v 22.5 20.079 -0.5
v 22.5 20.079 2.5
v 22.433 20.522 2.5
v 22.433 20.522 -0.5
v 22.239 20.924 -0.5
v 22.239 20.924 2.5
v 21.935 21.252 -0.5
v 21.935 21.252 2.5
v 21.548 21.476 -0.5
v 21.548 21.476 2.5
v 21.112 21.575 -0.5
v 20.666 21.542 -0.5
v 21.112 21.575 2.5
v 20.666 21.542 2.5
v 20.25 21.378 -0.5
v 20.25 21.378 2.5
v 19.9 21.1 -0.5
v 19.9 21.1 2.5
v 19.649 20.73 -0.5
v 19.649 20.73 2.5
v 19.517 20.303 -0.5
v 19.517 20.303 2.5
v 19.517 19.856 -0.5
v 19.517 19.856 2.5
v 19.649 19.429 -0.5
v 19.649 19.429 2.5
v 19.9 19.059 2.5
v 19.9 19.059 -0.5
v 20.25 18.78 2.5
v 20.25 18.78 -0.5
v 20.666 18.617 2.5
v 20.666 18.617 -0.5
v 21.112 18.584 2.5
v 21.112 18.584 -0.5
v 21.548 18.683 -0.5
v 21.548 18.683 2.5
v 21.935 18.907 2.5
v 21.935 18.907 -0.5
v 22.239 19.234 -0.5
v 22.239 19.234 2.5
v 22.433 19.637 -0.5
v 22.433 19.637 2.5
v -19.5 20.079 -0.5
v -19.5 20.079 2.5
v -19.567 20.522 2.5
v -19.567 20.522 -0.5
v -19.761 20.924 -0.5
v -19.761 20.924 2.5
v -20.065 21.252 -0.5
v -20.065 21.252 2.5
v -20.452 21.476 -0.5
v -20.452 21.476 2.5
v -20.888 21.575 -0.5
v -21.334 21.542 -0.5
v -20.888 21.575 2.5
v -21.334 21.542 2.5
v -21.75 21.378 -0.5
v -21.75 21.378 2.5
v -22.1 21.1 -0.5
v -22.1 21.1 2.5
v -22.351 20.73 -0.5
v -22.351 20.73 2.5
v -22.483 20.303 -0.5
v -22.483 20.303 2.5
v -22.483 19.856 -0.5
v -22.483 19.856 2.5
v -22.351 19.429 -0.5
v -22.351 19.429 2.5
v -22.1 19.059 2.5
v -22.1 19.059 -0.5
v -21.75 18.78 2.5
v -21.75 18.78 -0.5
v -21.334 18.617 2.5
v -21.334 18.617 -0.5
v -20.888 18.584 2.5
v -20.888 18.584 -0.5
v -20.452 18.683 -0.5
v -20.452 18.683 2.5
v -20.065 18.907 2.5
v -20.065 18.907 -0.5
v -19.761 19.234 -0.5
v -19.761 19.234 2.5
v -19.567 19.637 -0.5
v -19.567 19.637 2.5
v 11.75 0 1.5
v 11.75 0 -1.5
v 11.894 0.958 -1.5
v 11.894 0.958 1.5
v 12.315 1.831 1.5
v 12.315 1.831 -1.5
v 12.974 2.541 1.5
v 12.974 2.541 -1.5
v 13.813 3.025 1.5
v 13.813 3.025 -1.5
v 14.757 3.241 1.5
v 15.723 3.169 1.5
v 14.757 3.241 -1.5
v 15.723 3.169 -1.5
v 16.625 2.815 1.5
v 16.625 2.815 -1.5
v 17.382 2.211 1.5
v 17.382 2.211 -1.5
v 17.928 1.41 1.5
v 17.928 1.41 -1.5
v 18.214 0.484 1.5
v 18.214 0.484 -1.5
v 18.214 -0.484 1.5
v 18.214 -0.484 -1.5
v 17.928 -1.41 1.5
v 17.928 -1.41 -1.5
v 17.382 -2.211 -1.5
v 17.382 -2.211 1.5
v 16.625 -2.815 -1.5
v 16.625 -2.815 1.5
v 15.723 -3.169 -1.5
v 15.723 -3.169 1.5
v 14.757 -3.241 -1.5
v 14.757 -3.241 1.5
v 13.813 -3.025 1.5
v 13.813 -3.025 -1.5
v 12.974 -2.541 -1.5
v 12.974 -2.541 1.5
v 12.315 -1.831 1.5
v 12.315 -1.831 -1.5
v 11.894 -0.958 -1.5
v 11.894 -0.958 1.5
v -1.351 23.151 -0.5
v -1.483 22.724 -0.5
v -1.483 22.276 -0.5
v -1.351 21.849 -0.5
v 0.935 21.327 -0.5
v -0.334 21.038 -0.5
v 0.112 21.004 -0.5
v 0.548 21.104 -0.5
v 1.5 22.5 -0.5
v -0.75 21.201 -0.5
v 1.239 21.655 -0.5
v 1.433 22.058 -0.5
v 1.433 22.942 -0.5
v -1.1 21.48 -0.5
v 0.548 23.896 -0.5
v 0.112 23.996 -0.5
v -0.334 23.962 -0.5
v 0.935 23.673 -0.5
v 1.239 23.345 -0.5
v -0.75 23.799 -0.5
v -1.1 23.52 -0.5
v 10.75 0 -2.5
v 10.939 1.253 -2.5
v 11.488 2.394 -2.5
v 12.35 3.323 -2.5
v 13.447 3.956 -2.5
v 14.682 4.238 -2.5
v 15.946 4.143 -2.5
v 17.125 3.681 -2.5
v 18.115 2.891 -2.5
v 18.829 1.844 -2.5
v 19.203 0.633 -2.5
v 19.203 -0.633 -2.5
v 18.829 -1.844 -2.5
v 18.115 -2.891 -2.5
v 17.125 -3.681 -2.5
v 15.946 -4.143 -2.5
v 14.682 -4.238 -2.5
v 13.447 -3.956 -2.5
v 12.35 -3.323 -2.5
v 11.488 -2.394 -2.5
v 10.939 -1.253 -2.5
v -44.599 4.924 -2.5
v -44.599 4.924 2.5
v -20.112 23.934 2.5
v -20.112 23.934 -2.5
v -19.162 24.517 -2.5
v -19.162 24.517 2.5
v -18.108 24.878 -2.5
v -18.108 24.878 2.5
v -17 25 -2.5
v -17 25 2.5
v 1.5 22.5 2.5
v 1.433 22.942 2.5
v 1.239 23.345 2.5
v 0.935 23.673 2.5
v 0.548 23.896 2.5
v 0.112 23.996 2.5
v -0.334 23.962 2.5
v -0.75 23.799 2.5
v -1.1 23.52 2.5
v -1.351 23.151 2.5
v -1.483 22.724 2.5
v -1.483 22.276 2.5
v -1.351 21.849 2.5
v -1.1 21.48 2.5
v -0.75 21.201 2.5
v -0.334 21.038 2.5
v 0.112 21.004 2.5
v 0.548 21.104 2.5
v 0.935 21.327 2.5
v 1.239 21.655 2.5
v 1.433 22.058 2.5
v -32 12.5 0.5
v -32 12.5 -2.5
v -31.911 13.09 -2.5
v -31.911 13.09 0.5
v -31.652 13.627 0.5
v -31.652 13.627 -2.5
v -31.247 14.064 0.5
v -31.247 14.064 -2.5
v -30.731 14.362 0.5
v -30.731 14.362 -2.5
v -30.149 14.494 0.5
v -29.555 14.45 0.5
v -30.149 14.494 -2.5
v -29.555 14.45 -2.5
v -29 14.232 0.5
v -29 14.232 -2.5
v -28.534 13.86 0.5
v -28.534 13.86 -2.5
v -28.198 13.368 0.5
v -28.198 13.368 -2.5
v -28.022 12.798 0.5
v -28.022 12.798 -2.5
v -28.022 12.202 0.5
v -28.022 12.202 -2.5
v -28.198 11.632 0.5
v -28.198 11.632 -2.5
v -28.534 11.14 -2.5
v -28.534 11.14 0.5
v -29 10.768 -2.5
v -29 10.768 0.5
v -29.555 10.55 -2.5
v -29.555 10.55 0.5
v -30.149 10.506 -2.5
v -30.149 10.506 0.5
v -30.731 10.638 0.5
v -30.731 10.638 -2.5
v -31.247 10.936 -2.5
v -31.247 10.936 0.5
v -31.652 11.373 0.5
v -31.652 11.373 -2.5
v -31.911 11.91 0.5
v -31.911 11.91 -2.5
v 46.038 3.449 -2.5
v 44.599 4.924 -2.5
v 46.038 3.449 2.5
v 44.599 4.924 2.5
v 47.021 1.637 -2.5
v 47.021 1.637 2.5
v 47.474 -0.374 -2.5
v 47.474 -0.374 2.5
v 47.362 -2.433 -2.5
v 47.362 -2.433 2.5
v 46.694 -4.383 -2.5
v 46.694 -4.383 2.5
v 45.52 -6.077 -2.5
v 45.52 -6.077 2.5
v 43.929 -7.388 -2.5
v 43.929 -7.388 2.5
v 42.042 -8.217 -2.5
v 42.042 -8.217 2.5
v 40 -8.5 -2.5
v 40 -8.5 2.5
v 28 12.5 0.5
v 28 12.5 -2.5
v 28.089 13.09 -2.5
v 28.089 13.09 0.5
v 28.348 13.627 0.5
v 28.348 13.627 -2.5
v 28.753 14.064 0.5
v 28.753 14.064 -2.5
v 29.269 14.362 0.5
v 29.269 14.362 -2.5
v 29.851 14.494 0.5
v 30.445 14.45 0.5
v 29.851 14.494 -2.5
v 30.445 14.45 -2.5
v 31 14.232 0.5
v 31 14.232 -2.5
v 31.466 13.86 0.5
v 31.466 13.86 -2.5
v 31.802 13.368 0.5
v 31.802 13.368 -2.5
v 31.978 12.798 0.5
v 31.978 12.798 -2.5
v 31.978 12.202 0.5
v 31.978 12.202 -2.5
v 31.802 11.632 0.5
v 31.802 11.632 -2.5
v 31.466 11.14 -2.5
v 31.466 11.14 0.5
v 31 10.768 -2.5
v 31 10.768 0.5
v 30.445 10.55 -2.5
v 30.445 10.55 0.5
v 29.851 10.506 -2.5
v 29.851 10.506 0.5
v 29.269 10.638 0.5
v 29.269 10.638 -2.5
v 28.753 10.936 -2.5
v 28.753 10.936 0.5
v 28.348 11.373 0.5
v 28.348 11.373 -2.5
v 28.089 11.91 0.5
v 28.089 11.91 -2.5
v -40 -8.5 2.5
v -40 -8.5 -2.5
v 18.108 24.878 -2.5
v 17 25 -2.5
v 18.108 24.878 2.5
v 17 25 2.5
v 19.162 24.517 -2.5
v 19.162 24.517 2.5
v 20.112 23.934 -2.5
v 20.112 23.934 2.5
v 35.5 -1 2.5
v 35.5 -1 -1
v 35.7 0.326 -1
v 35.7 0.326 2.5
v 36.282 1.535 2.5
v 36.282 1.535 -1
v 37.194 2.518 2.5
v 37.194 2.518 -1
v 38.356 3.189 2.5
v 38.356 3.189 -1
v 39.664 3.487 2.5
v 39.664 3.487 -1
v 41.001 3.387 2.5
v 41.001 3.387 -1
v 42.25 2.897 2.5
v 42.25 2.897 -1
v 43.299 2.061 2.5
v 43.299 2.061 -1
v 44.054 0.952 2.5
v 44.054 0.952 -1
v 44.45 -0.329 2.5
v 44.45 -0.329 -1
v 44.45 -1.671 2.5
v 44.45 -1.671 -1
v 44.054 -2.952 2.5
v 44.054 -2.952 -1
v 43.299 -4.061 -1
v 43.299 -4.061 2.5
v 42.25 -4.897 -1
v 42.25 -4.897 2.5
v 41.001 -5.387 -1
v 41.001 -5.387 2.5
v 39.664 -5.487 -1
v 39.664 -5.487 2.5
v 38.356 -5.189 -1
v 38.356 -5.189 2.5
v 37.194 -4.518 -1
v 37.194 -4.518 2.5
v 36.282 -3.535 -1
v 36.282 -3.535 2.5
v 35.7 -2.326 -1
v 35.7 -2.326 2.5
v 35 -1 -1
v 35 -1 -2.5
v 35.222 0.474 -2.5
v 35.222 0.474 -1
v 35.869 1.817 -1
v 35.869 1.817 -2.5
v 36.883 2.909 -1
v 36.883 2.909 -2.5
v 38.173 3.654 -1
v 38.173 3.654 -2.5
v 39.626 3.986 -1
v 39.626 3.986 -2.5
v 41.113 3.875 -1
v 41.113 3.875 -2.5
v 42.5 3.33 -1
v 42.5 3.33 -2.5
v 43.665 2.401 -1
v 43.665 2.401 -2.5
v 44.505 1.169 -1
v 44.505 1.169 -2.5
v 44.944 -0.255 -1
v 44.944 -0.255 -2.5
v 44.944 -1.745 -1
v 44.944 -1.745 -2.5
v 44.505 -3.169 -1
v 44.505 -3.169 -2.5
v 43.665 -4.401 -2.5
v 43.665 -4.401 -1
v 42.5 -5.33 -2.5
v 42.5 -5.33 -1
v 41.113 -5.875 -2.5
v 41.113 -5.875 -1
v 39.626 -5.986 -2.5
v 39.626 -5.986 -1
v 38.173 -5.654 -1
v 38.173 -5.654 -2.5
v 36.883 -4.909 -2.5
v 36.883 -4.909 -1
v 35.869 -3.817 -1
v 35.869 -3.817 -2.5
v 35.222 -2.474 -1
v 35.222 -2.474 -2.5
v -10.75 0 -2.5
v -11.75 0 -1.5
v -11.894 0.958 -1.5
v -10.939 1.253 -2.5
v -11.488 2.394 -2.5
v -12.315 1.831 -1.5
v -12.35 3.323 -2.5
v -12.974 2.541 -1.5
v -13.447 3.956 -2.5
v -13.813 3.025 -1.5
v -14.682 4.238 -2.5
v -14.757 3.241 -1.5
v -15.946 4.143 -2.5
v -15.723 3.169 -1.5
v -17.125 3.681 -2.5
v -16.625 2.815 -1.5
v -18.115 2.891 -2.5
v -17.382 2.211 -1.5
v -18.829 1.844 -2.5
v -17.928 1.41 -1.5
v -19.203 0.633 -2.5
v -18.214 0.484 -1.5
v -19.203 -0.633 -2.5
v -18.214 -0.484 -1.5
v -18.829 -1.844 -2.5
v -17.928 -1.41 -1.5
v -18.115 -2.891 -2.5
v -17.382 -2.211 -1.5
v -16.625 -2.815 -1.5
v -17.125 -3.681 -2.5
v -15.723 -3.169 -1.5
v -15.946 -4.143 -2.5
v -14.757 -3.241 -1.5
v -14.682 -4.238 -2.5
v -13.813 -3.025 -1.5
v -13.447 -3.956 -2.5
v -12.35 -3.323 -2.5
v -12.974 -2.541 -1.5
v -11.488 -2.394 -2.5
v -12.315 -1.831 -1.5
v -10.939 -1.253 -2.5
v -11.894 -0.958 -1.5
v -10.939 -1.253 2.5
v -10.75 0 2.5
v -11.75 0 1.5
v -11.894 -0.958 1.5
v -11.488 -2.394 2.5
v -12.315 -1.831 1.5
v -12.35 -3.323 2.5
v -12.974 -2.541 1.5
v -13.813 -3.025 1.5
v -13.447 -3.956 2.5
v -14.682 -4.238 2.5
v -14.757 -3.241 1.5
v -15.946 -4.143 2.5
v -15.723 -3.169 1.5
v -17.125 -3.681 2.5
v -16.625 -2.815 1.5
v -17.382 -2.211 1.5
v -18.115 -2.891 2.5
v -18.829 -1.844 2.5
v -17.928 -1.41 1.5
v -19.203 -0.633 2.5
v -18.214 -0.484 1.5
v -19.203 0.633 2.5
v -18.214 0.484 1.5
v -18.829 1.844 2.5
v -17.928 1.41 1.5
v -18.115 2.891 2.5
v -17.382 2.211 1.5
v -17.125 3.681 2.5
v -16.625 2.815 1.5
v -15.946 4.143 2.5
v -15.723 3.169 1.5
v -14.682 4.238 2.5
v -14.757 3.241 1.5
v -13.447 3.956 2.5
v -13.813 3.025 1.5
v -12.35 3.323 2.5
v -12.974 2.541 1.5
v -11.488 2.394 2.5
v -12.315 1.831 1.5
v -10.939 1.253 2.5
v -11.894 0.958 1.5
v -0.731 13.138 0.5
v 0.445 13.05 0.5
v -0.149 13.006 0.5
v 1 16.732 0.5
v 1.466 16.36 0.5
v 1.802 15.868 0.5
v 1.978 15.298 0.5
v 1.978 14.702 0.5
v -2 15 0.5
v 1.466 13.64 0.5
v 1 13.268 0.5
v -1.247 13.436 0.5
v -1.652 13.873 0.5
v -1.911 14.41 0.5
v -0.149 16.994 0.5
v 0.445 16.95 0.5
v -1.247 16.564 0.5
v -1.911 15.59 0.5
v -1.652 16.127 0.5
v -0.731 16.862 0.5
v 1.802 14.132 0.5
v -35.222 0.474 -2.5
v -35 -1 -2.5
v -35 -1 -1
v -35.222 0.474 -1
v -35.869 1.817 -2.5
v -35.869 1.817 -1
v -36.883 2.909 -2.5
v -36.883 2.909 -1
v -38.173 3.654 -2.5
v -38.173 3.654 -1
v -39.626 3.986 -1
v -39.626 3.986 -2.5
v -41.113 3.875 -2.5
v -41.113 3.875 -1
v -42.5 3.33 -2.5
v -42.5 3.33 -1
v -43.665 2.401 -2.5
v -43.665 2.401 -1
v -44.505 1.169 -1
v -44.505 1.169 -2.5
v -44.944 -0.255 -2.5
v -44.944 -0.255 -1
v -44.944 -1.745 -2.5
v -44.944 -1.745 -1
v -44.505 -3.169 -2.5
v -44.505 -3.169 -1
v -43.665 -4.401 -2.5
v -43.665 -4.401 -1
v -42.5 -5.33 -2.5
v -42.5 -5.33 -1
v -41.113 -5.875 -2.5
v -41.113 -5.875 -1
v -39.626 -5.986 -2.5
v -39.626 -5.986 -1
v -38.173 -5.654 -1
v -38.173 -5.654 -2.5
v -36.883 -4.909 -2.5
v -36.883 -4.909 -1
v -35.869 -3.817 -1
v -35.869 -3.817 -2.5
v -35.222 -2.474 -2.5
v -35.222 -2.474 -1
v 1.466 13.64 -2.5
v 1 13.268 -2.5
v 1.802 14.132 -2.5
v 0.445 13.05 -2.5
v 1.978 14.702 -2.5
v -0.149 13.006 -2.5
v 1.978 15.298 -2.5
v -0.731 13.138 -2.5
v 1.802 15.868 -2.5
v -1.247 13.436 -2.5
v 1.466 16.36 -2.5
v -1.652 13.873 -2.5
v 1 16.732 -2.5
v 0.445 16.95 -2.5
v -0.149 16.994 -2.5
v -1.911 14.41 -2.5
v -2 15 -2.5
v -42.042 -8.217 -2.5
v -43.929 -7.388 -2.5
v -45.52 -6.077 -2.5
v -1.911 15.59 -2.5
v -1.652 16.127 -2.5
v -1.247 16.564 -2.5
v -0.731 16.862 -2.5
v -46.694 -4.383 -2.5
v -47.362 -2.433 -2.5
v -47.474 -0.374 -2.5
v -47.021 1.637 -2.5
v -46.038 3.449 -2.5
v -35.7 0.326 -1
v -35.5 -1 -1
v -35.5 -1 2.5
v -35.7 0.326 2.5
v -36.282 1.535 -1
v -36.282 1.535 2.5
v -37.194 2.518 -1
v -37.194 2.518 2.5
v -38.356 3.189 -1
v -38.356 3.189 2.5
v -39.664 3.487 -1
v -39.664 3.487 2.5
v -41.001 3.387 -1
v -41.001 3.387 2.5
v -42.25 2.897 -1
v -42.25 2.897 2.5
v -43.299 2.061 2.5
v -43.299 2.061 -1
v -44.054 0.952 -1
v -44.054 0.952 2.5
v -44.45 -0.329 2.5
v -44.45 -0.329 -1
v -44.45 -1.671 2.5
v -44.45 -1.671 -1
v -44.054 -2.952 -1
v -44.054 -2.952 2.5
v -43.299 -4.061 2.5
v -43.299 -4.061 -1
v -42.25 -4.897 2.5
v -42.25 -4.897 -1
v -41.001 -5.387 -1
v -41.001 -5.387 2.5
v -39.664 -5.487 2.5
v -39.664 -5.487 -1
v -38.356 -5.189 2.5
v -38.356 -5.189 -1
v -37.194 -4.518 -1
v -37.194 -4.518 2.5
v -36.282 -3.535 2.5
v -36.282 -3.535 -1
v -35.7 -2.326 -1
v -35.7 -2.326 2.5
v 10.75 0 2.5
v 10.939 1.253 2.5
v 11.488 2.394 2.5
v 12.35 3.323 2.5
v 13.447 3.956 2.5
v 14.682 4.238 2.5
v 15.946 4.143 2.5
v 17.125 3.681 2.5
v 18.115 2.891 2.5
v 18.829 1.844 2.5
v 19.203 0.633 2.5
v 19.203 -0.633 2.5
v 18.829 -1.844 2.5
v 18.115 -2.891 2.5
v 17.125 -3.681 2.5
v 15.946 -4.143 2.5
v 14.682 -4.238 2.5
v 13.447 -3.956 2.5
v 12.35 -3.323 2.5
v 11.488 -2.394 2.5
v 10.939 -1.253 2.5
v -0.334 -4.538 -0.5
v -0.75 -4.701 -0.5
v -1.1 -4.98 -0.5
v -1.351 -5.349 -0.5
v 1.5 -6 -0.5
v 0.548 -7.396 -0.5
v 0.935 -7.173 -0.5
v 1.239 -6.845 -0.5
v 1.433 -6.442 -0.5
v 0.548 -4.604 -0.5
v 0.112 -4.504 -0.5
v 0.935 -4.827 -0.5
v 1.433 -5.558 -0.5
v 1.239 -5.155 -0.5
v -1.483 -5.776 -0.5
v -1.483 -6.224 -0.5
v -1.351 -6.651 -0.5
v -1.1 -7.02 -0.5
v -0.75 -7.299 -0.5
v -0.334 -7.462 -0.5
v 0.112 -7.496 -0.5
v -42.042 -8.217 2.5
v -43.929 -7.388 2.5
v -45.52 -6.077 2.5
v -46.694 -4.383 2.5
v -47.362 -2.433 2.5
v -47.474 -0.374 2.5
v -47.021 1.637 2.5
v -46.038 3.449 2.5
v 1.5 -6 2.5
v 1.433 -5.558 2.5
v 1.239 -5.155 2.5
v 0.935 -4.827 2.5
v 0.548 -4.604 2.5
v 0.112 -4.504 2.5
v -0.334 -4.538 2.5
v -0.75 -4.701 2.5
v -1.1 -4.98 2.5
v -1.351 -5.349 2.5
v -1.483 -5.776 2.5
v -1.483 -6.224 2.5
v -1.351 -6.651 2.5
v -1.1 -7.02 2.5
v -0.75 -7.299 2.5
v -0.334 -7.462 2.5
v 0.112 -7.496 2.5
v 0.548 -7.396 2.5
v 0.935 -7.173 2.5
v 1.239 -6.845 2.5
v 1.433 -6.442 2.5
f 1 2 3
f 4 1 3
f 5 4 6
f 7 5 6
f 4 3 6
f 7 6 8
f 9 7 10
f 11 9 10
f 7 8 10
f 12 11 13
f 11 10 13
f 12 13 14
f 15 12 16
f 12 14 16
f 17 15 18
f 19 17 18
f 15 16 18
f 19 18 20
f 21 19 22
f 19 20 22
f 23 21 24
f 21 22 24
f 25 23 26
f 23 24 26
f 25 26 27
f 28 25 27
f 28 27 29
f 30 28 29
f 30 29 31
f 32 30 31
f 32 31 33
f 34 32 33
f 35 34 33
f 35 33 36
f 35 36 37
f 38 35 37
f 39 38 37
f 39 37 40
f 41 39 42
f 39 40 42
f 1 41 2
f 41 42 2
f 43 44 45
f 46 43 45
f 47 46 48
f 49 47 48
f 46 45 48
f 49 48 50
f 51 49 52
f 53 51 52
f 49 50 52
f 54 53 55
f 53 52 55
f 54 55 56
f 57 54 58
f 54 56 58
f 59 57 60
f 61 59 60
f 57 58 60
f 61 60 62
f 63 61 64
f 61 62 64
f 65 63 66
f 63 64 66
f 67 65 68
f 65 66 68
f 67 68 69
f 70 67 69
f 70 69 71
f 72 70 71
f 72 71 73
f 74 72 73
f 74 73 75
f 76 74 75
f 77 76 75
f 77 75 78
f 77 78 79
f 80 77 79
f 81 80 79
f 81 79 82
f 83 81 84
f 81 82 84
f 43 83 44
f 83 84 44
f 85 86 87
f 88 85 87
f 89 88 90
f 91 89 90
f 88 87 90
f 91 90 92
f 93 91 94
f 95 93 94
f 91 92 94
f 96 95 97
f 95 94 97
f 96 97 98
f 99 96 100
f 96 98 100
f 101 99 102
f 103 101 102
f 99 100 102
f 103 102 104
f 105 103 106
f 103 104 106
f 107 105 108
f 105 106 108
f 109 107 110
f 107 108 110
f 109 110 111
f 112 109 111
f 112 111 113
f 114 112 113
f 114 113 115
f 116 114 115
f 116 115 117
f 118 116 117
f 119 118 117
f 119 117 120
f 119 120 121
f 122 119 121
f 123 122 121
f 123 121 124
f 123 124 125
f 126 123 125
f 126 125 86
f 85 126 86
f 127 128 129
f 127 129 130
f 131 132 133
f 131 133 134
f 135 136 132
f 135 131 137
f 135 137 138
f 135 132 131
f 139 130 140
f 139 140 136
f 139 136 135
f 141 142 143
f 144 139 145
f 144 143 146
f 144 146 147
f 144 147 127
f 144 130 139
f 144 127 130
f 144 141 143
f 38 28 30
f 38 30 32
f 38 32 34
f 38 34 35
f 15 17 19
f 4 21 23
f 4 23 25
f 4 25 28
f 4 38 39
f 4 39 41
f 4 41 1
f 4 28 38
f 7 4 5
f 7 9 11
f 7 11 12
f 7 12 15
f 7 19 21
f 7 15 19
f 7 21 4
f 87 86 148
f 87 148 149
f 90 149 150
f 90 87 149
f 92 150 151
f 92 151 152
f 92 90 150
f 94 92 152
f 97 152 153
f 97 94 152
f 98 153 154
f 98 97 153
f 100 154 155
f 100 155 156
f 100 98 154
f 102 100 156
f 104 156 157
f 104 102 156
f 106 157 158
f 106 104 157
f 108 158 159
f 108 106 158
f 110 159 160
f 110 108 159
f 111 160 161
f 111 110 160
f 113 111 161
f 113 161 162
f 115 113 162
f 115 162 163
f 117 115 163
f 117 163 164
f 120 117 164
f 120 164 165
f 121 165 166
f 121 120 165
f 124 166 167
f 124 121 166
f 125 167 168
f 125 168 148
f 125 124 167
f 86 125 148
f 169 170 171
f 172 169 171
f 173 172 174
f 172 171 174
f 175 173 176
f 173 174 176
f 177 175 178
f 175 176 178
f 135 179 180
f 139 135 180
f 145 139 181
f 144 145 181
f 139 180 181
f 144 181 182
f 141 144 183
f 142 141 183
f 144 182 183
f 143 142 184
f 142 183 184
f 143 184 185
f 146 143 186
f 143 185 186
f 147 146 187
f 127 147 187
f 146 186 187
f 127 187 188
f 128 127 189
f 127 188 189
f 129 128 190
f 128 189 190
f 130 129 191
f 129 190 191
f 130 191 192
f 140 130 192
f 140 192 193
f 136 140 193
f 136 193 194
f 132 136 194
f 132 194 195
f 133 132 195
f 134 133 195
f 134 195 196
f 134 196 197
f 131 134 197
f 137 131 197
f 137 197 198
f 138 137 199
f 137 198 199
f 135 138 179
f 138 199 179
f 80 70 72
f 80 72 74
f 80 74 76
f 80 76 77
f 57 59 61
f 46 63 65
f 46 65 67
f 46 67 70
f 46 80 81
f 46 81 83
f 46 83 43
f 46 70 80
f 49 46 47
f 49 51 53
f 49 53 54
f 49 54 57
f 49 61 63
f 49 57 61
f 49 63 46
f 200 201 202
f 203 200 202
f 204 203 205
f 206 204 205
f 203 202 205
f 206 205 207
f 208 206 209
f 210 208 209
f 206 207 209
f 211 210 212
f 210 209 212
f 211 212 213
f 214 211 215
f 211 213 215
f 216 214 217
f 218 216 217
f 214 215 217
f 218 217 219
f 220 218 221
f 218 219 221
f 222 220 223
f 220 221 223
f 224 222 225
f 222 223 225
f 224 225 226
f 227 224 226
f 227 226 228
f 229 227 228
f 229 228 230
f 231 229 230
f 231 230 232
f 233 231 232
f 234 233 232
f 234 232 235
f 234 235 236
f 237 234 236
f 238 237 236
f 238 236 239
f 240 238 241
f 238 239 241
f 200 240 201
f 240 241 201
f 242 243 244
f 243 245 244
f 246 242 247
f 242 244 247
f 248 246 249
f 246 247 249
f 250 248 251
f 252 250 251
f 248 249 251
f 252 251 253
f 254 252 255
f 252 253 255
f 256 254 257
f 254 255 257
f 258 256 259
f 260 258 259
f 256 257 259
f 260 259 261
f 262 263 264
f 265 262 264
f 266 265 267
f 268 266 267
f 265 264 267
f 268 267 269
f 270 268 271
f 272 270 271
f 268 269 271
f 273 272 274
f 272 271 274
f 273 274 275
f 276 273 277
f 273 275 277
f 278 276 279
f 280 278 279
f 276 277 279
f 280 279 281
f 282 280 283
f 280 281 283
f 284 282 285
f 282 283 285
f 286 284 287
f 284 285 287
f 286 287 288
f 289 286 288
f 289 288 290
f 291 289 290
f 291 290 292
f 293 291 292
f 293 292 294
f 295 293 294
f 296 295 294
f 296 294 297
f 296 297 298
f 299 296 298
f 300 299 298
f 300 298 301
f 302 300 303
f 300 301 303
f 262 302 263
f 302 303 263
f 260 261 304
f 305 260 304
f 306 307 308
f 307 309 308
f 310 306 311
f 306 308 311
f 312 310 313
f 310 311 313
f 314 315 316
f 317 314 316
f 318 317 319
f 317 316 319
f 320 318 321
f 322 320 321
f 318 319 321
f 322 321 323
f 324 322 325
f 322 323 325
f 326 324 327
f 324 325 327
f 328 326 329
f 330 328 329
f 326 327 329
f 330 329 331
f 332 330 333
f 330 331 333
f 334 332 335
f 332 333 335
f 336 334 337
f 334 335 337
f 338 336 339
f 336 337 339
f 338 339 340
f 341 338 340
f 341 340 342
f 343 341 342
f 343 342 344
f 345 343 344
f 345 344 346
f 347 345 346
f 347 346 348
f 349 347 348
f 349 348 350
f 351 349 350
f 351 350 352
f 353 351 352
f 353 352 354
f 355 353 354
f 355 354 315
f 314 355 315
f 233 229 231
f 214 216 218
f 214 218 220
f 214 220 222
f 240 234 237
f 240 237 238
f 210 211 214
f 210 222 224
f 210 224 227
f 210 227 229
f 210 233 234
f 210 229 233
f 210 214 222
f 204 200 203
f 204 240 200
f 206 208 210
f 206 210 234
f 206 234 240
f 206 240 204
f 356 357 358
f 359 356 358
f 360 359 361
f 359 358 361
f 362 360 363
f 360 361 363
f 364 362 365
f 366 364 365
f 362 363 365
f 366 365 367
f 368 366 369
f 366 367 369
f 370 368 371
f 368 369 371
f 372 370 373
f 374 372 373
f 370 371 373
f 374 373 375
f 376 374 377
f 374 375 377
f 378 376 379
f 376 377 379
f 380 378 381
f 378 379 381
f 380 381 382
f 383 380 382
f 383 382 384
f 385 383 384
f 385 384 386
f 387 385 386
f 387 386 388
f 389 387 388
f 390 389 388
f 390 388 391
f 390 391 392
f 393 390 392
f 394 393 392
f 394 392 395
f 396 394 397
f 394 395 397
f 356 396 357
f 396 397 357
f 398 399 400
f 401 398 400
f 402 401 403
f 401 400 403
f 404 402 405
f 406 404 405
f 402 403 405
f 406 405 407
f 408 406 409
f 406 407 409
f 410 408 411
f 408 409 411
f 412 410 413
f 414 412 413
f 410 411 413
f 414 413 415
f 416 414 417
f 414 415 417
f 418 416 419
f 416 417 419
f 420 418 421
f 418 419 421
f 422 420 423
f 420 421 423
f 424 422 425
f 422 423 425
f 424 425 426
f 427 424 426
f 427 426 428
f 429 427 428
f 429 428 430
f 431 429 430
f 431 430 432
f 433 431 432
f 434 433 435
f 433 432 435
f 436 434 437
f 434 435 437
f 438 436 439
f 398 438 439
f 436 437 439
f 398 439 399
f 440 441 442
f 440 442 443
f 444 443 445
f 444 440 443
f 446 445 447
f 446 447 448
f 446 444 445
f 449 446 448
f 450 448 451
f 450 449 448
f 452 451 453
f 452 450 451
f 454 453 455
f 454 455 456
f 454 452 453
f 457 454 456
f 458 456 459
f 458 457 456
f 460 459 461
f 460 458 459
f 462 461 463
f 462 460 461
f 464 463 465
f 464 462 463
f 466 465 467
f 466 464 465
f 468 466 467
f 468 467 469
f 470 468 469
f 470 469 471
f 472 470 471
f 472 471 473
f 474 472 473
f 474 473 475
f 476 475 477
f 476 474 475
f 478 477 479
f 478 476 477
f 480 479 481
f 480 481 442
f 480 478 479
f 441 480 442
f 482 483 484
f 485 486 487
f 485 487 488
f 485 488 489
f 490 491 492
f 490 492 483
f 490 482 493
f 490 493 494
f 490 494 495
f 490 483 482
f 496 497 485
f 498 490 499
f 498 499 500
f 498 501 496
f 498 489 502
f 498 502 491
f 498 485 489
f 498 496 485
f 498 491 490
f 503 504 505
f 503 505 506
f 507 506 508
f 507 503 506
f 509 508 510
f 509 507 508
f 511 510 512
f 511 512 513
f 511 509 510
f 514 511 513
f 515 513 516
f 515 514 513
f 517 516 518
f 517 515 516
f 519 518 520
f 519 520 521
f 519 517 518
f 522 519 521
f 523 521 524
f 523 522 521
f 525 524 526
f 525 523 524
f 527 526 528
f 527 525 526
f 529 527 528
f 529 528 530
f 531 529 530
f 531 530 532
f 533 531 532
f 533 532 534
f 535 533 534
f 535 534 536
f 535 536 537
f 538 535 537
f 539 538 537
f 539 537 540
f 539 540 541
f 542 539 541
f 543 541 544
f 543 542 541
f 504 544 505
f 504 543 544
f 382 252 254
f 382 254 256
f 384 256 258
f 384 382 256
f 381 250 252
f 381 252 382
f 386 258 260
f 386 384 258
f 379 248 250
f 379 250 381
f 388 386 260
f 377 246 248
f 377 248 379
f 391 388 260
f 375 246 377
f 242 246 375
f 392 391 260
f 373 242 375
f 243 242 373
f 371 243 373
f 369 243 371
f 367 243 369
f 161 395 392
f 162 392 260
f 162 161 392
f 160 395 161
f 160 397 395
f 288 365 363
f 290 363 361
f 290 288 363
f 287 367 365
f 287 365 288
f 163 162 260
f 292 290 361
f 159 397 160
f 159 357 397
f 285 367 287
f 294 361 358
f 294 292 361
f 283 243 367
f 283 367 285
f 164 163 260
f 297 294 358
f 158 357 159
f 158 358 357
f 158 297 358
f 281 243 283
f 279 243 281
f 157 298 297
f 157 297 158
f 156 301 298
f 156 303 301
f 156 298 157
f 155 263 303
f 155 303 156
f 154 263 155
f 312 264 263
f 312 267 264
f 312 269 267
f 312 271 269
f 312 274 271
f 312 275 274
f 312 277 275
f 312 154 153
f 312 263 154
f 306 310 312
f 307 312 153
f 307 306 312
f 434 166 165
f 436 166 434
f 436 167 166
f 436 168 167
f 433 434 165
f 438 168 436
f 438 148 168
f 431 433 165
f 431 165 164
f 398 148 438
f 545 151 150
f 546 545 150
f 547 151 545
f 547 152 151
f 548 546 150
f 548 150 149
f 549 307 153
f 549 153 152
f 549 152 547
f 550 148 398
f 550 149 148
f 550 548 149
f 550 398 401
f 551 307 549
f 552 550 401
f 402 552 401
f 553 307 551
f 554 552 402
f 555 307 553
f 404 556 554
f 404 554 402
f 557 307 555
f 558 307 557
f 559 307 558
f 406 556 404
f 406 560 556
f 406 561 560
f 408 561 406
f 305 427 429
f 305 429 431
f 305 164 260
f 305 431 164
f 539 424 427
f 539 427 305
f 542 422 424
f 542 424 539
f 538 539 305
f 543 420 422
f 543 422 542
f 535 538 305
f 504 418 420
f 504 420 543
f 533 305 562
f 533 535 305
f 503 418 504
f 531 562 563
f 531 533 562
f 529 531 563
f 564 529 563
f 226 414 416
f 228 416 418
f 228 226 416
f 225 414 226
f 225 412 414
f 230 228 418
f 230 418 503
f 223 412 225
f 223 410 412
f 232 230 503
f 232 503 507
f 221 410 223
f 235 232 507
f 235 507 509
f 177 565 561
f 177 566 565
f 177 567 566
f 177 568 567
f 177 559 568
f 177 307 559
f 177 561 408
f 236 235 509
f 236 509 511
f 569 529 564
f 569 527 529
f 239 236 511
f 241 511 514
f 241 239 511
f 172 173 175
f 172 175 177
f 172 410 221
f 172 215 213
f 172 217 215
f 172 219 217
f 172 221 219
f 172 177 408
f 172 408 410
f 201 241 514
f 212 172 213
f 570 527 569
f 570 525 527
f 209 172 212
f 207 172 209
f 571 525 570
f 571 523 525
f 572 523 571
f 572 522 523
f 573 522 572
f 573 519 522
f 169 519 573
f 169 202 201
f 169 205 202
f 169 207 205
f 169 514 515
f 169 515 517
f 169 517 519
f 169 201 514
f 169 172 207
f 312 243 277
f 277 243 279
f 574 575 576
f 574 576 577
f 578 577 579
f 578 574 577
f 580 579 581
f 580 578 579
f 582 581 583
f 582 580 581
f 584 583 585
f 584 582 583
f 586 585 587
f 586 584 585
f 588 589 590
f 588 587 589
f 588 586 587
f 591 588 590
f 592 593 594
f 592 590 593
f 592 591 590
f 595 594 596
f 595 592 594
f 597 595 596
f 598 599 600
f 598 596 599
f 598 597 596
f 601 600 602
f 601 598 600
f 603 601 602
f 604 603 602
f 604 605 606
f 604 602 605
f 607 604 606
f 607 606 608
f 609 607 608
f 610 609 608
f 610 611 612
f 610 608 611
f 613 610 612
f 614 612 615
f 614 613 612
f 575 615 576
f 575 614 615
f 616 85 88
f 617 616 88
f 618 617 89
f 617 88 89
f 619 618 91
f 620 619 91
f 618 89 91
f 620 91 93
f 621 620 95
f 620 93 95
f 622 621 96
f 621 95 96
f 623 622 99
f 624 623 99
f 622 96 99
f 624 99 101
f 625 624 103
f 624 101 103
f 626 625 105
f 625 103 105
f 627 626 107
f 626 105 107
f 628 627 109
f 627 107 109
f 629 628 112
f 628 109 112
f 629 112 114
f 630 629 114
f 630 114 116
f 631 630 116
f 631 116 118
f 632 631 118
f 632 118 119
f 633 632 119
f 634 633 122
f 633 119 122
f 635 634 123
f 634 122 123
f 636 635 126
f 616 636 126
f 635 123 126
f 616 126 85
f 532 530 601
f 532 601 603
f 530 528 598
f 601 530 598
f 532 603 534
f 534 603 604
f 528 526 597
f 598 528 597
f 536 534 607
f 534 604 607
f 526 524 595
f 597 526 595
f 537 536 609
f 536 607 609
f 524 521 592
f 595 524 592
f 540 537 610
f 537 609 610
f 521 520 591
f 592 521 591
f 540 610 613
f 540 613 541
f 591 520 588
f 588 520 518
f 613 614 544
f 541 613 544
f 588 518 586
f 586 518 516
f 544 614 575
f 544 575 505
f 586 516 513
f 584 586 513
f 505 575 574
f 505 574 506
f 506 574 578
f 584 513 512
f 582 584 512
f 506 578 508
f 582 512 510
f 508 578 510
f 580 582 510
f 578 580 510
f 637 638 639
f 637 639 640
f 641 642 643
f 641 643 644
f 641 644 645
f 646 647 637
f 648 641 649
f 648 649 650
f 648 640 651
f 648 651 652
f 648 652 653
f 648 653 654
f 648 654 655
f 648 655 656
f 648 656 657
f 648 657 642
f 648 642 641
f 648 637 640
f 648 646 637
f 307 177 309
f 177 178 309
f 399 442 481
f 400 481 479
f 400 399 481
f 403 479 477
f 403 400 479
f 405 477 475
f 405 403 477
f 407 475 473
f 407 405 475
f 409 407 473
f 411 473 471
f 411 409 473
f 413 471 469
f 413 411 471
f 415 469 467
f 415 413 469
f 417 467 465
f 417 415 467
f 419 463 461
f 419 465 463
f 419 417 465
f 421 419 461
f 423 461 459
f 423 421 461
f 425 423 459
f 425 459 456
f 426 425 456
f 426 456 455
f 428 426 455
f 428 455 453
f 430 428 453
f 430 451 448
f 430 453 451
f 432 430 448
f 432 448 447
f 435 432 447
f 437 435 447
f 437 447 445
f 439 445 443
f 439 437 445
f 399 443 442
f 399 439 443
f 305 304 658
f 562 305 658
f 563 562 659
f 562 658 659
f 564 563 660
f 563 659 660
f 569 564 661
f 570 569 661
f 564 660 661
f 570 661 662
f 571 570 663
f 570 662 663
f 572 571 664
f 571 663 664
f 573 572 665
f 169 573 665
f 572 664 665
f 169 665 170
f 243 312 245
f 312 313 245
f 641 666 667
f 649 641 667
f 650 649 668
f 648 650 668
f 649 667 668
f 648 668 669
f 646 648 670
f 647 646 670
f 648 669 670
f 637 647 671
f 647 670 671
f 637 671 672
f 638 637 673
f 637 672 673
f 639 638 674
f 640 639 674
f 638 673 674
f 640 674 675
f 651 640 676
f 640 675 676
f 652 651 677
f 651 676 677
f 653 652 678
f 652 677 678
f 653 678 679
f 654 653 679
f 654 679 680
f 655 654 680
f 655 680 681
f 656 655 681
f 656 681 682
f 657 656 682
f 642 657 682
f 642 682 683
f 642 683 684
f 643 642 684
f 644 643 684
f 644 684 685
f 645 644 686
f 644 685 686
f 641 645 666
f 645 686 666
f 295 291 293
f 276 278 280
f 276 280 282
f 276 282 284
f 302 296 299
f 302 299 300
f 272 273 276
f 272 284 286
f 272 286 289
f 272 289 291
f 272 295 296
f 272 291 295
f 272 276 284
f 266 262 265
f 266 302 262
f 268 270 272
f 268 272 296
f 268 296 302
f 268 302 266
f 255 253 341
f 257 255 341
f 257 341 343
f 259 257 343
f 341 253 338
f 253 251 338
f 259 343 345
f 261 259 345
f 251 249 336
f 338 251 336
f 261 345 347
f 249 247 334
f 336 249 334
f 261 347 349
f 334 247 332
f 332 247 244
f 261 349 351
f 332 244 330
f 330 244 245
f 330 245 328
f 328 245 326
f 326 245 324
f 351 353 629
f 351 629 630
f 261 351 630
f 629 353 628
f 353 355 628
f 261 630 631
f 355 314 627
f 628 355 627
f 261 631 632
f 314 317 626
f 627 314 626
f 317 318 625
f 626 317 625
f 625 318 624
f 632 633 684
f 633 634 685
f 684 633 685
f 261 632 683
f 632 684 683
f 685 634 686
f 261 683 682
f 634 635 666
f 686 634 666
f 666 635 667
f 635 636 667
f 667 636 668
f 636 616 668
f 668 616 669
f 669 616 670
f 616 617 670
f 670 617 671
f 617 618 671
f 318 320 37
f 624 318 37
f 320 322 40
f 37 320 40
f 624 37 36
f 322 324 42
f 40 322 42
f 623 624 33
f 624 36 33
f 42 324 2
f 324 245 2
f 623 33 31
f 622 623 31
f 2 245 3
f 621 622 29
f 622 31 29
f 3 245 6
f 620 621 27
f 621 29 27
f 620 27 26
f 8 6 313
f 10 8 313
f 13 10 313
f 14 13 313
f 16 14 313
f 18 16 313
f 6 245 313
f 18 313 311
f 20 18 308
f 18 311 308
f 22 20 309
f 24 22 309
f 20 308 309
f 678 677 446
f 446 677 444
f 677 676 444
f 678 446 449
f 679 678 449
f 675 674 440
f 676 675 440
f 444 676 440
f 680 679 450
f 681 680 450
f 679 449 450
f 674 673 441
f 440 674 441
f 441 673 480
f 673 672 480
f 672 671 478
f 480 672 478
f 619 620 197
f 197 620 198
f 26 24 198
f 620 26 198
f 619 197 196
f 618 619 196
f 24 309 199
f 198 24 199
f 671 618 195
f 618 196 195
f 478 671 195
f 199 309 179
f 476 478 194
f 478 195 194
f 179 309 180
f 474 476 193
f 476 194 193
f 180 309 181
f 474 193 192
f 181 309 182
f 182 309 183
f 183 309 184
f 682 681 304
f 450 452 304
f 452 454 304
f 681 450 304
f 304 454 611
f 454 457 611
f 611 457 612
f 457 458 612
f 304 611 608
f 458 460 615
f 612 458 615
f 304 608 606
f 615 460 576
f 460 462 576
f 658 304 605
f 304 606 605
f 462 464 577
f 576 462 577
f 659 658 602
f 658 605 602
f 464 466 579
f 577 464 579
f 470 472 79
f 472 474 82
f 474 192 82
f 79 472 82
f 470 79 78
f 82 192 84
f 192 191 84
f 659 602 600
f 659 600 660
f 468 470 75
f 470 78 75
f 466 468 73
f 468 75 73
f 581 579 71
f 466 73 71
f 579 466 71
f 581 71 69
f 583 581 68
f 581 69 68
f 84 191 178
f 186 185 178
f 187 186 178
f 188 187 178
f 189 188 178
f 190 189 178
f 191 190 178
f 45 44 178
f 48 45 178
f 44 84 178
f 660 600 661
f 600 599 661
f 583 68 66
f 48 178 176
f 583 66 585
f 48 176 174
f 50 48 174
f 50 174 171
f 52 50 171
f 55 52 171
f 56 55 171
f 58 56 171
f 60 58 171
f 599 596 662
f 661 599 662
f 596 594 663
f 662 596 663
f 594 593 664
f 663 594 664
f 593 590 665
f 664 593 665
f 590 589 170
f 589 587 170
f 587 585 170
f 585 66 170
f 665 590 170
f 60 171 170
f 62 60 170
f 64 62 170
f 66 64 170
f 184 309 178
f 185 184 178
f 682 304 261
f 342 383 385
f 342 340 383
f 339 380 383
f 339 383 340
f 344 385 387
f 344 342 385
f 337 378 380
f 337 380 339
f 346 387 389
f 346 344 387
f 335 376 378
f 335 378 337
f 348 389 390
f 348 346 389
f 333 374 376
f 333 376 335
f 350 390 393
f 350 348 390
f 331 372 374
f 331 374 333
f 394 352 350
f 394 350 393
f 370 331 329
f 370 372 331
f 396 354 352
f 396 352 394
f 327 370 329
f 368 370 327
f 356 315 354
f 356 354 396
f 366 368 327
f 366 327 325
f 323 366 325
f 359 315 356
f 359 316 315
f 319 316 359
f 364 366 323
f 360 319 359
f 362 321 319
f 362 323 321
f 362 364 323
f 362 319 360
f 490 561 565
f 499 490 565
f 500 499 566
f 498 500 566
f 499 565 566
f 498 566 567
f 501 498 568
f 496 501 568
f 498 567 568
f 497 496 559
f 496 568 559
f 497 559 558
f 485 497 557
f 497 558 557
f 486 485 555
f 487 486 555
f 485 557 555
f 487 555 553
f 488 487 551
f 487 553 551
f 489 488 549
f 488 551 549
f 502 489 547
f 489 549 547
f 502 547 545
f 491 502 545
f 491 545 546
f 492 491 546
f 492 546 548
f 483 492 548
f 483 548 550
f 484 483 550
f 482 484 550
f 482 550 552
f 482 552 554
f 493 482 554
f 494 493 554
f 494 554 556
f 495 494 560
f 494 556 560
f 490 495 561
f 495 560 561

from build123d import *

# Parameters (mm, degrees)
BOSS_EXTRUDE2_DEPTH      = 2.5
SKETCH3_R                = 4.5
CUT_EXTRUDE3_DEPTH       = 8
SKETCH4_R                = 5
CUT_EXTRUDE4_DEPTH       = 1.5
SKETCH5_R                = 3.25
CUT_EXTRUDE5_DEPTH       = 10
CHAMFER6_SIZE            = 1
CHAMFER6_OF_MIRROR7_SIZE = 1
SKETCH6_R                = 2
CUT_EXTRUDE6_DEPTH       = 3
SKETCH7_R                = 1.5
CUT_EXTRUDE7_DEPTH       = 3
SKETCH8_R                = 1.5
CUT_EXTRUDE8_DEPTH       = 3


with BuildPart() as part:
    # Sketch1 → Boss-Extrude2 (new body, symmetric)
    with BuildSketch(Plane.XY):
        with BuildLine():
            Line((-44.599094606, 4.924384255), (-20.111639684, 23.933975293))
            ThreePointArc((-20.111639684, 23.933975293), (-18.64459039, 24.726101678), (-17, 25))
            Line((-17, 25), (17, 25))
            ThreePointArc((17, 25), (18.64459039, 24.726101678), (20.111639684, 23.933975293))
            Line((20.111639684, 23.933975293), (44.599094606, 4.924384255))
            ThreePointArc((44.599094606, 4.924384255), (47.095170256, -3.430752773), (40, -8.5))
            Line((40, -8.5), (-40, -8.5))
            ThreePointArc((-40, -8.5), (-47.095170256, -3.430752773), (-44.599094606, 4.924384255))
        make_face()
    extrude(amount=BOSS_EXTRUDE2_DEPTH, both=True)

    # Sketch3 → Cut-Extrude3 (cut)
    with BuildSketch(Plane(origin=(0, 0, -2.5), x_dir=(-1, 0, 0), z_dir=(0, 0, -1))):
        with Locations((-40, -1)):
            Circle(SKETCH3_R)
    cut_extrude3 = extrude(amount=-CUT_EXTRUDE3_DEPTH, mode=Mode.SUBTRACT)

    # Sketch4 → Cut-Extrude4 (cut)
    with BuildSketch(Plane(origin=(0, 0, -2.5), x_dir=(-1, 0, 0), z_dir=(0, 0, -1))):
        with Locations((-40, -1)):
            Circle(SKETCH4_R)
    cut_extrude4 = extrude(amount=-CUT_EXTRUDE4_DEPTH, mode=Mode.SUBTRACT)

    # Mirror1: Cut-Extrude3, Cut-Extrude4 across plane
    add(cut_extrude3.mirror(Plane(origin=(0, 0, 0), x_dir=(0, 0, 1), z_dir=(1, 0, 0))), mode=Mode.SUBTRACT)
    add(cut_extrude4.mirror(Plane(origin=(0, 0, 0), x_dir=(0, 0, 1), z_dir=(1, 0, 0))), mode=Mode.SUBTRACT)

    # Sketch5 → Cut-Extrude5 (cut)
    with BuildSketch(Plane(origin=(0, 0, -2.5), x_dir=(-1, 0, 0), z_dir=(0, 0, -1))):
        with Locations((-15, 0)):
            Circle(SKETCH5_R)
    cut_extrude5 = extrude(amount=-CUT_EXTRUDE5_DEPTH, mode=Mode.SUBTRACT)

    # Chamfer6
    chamfer6_edges = [part.edges().sort_by_distance(p)[0] for p in [
        (18.25, 0, 2.5),
        (18.25, 0, -2.5),
    ]]
    chamfer(chamfer6_edges, length=CHAMFER6_SIZE)

    # Mirror7: Cut-Extrude5 across plane
    add(cut_extrude5.mirror(Plane(origin=(0, 0, 0), x_dir=(0, 0, 1), z_dir=(1, 0, 0))), mode=Mode.SUBTRACT)

    # Chamfer6 of Mirror7
    chamfer6_of_mirror7_edges = [part.edges().sort_by_distance(p)[0] for p in [
        (-18.25, 0, 2.5),
        (-18.25, 0, -2.5),
    ]]
    chamfer(chamfer6_of_mirror7_edges, length=CHAMFER6_OF_MIRROR7_SIZE)

    # Sketch6 → Cut-Extrude6 (cut)
    with BuildSketch(Plane(origin=(0, 0, -2.5), x_dir=(-1, 0, 0), z_dir=(0, 0, -1))):
        with Locations((0, 15)):
            Circle(SKETCH6_R)
        with Locations((30, 12.5)):
            Circle(SKETCH6_R)
        with Locations((-30, 12.5)):
            Circle(SKETCH6_R)
    extrude(amount=-CUT_EXTRUDE6_DEPTH, mode=Mode.SUBTRACT)

    # Sketch7 → Cut-Extrude7 (cut)
    with BuildSketch(Plane.XY.offset(2.5)):
        with Locations((21, 20.079456047)):
            Circle(SKETCH7_R)
        with Locations((0, -6)):
            Circle(SKETCH7_R)
        with Locations((-21, 20.079456047)):
            Circle(SKETCH7_R)
    extrude(amount=-CUT_EXTRUDE7_DEPTH, mode=Mode.SUBTRACT)

    # Sketch8 → Cut-Extrude8 (cut)
    with BuildSketch(Plane.XY.offset(2.5)):
        with Locations((0, 22.5)):
            Circle(SKETCH8_R)
    extrude(amount=-CUT_EXTRUDE8_DEPTH, mode=Mode.SUBTRACT)


solid = part.part
